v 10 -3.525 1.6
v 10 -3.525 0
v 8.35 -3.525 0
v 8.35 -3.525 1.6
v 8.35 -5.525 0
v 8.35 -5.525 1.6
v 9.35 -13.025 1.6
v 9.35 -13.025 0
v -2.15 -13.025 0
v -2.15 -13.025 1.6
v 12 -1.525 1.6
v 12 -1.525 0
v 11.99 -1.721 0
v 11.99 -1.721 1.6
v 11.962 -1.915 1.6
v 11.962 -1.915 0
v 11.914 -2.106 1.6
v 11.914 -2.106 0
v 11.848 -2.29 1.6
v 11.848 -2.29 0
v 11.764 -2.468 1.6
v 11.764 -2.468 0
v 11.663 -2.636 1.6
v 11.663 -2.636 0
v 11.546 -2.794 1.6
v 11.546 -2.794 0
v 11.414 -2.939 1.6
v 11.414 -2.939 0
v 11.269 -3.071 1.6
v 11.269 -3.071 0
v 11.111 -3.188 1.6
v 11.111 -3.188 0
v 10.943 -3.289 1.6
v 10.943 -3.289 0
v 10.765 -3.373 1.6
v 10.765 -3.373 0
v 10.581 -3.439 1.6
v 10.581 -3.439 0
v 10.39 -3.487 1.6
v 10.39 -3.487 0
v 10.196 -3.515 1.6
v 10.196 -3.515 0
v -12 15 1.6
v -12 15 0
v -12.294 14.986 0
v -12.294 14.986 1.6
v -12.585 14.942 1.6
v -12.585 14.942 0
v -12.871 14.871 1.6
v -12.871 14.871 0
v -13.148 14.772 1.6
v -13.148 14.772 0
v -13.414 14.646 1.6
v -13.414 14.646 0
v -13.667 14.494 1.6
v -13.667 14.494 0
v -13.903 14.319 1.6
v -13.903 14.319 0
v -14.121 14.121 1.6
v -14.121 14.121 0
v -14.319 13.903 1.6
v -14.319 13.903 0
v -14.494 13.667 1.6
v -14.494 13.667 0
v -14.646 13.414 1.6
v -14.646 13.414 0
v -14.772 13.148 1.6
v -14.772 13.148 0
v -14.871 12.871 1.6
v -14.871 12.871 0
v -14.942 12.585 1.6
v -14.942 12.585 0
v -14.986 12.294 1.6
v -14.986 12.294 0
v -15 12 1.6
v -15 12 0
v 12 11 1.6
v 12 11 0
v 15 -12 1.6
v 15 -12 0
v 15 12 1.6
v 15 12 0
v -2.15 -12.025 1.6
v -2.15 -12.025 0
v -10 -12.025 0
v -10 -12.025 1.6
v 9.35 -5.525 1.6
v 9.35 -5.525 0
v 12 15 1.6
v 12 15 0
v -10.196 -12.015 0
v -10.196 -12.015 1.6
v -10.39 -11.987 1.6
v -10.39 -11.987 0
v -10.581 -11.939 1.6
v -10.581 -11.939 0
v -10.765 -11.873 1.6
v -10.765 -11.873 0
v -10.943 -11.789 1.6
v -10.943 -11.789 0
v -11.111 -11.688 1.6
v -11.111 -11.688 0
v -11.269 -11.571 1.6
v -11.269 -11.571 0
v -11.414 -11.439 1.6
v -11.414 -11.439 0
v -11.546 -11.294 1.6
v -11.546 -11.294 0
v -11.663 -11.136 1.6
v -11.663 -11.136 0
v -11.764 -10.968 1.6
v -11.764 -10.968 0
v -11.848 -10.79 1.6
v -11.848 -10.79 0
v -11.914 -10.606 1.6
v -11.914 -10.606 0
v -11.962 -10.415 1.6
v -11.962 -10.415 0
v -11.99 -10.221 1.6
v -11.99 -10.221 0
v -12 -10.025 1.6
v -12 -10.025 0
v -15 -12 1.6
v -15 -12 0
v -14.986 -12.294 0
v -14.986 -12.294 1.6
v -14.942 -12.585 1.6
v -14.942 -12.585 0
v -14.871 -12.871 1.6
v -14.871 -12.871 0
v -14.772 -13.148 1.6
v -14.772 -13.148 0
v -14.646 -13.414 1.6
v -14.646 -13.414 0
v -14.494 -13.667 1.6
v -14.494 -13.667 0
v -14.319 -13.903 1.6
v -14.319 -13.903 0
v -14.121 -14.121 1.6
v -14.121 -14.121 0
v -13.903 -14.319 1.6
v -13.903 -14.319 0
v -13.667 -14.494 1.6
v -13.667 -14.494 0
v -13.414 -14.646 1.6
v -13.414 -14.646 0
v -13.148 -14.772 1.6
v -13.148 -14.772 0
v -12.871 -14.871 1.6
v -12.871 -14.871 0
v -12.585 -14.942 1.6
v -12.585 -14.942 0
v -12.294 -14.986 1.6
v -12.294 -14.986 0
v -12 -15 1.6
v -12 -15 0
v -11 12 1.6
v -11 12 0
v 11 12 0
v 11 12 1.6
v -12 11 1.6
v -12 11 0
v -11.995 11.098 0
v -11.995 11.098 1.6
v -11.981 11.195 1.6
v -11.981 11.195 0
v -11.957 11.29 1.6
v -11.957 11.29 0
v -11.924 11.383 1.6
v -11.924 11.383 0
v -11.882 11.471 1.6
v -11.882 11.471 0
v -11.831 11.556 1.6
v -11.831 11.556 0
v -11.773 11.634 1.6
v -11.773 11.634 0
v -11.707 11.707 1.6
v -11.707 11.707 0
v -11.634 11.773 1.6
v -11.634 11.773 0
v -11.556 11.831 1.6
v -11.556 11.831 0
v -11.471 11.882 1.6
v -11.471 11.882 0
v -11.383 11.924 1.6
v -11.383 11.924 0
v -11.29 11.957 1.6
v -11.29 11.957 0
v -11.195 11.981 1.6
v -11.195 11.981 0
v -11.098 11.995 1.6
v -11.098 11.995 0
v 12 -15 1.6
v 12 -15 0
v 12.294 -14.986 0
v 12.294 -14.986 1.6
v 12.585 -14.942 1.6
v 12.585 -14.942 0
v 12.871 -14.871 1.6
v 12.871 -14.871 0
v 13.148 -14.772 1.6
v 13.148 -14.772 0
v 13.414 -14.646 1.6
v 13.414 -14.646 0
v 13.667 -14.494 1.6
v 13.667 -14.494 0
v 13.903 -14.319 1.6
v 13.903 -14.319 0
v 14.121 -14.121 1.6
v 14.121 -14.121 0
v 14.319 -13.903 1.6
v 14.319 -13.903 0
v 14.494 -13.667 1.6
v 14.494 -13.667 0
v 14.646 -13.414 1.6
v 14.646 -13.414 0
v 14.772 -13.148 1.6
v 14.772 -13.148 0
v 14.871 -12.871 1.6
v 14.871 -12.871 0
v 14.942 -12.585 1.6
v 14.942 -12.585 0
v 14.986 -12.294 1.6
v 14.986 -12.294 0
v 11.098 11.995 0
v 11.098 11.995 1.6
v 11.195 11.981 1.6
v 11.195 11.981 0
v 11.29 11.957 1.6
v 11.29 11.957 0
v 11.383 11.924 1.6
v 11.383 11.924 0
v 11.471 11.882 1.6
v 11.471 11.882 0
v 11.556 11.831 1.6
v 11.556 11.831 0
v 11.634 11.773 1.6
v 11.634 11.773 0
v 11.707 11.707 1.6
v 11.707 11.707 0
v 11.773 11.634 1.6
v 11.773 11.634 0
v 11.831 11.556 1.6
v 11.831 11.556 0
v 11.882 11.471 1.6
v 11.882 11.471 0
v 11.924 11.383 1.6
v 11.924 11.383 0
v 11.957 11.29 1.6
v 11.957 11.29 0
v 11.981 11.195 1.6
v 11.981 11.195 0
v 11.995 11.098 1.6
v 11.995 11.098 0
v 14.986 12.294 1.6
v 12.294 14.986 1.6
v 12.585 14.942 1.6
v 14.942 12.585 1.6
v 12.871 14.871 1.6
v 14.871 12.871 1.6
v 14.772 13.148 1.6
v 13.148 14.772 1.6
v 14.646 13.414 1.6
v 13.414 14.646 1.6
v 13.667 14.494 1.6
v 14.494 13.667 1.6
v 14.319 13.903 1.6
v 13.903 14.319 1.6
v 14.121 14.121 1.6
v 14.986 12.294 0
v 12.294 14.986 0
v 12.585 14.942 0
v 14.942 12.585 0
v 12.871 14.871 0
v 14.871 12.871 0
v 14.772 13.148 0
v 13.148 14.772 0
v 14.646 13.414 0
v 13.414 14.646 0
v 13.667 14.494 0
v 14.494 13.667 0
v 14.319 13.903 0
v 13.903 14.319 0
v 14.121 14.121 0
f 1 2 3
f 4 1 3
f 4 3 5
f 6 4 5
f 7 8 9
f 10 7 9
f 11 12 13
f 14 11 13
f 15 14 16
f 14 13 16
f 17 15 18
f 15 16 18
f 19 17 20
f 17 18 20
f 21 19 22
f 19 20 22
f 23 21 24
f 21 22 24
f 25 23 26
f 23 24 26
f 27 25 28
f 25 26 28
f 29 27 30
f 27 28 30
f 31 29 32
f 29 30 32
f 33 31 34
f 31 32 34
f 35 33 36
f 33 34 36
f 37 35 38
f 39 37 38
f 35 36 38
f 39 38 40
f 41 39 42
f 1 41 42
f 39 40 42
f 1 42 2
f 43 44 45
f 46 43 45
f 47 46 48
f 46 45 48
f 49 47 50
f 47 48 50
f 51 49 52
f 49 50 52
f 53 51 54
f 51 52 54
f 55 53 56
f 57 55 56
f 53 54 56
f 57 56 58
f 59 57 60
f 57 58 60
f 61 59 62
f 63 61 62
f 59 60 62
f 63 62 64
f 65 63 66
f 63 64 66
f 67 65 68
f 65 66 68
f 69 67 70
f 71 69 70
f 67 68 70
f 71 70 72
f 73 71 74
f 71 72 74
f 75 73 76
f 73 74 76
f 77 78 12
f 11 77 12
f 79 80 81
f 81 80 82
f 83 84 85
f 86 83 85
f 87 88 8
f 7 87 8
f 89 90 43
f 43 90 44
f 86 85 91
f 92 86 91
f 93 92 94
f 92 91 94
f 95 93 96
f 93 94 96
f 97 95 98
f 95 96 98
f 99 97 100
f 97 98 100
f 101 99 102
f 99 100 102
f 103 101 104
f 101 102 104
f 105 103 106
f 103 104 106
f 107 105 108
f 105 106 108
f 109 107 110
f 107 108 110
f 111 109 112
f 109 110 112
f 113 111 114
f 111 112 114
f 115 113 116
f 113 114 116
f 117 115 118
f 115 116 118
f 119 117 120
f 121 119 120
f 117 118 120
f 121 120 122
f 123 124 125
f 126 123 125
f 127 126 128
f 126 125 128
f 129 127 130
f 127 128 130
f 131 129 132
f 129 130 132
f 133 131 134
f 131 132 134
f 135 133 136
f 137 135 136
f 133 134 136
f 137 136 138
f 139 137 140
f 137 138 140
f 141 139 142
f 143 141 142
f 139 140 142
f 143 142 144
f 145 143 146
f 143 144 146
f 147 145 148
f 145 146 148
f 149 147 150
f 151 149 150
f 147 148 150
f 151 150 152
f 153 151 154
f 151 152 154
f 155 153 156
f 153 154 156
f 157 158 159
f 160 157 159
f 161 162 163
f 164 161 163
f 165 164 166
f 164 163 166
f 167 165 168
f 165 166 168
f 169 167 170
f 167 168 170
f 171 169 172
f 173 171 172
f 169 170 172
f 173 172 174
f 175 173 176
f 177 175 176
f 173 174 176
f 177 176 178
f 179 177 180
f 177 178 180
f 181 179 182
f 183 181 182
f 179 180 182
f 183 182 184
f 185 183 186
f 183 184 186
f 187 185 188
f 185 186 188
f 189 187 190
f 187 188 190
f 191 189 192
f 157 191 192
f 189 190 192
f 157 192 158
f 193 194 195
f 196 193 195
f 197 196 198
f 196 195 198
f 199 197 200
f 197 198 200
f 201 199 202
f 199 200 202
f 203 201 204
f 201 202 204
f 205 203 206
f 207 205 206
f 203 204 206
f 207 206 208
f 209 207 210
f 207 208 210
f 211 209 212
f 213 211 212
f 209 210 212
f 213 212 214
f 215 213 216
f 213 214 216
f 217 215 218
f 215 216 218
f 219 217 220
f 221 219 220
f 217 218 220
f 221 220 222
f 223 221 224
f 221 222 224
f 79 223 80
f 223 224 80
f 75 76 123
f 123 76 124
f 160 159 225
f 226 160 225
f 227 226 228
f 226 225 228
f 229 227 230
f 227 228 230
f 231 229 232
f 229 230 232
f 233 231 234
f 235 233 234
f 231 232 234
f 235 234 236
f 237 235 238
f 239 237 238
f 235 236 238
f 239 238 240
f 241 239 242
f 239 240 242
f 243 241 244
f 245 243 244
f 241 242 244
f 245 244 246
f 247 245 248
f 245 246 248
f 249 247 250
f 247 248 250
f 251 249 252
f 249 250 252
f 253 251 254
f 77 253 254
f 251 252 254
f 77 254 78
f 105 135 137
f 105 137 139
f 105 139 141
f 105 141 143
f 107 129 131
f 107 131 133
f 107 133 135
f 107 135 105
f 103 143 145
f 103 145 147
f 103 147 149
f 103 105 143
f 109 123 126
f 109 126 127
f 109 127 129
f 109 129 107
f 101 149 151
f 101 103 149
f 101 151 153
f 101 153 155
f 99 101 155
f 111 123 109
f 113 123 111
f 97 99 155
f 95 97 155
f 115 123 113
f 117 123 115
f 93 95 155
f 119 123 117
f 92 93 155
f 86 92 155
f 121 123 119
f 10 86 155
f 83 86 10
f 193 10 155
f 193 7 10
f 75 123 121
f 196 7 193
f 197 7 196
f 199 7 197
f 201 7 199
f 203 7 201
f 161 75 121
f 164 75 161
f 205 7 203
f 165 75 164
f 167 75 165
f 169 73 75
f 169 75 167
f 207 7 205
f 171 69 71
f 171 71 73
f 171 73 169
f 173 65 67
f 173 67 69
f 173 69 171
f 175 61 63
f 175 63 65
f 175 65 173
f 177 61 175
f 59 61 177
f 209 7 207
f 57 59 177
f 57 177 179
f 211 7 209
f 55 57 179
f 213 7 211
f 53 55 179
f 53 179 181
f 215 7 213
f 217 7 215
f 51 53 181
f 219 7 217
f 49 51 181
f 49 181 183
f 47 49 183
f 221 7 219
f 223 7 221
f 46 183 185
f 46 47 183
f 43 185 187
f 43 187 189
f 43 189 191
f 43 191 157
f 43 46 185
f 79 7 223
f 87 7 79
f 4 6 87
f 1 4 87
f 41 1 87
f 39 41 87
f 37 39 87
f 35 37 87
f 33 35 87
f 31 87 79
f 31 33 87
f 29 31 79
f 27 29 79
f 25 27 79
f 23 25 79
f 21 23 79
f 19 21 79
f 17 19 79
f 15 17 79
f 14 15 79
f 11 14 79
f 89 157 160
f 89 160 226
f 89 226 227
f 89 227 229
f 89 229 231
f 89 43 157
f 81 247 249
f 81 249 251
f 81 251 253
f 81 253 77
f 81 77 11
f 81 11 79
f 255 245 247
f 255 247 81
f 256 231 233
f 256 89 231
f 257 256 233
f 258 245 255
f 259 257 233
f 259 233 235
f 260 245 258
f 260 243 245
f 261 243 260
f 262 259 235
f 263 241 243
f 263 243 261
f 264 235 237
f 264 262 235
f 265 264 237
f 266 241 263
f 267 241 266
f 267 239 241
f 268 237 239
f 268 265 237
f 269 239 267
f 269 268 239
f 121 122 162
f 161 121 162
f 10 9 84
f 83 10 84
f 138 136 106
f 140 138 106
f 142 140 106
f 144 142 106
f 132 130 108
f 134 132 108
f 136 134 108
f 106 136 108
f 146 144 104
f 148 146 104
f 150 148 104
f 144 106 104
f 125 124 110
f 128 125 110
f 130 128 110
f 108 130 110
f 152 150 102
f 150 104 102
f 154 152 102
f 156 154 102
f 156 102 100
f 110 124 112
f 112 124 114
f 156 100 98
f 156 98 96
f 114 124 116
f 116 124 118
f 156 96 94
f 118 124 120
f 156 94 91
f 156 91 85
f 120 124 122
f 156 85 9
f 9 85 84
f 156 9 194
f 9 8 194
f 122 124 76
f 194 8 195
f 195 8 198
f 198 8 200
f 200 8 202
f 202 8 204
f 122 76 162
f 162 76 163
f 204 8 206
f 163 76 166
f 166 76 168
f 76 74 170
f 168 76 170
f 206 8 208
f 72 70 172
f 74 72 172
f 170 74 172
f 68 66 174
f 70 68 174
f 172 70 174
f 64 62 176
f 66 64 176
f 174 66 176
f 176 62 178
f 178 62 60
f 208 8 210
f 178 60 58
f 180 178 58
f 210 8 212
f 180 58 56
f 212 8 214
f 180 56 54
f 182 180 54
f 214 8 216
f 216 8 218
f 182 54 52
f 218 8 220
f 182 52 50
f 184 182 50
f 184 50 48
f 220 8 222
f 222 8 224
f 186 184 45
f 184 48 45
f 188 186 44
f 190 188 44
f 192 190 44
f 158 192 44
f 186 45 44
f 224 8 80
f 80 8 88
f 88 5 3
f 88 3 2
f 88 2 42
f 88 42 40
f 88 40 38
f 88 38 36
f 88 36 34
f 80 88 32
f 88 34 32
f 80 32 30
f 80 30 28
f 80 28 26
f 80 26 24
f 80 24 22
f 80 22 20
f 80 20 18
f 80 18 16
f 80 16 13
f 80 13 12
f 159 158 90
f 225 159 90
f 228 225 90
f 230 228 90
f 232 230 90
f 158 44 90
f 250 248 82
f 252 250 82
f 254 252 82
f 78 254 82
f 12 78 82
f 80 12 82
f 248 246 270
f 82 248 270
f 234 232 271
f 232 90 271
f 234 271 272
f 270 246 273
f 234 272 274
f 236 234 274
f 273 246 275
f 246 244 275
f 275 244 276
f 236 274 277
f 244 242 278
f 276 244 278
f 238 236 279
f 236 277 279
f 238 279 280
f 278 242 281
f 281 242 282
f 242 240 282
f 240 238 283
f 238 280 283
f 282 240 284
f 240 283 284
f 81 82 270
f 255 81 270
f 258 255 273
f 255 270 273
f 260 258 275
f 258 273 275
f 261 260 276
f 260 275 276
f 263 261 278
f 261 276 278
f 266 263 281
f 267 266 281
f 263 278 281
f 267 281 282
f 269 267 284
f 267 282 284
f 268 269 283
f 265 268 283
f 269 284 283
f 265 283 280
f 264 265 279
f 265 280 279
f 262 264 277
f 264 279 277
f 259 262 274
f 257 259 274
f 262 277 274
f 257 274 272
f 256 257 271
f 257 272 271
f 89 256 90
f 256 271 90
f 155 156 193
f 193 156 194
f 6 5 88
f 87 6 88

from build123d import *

# Parameters (mm, degrees)
F1_DEPTH = 1.6


# Not quite as in the source:
# - a feature names something its author has since deleted; it is built from what else it names


with BuildPart() as f1:
    # F0 (on Top) → F1 (new body)
    with BuildSketch(Plane.XY):
        with BuildLine():
            ThreePointArc((15, 12), (14.1213203436, 14.1213203436), (12, 15))
            Line((12, 15), (-12, 15))
            ThreePointArc((-12, 15), (-14.1213203436, 14.1213203436), (-15, 12))
            Line((-15, 12), (-15, -12))
            ThreePointArc((-15, -12), (-14.1213203436, -14.1213203436), (-12, -15))
            Line((-12, -15), (12, -15))
            ThreePointArc((12, -15), (14.1213203436, -14.1213203436), (15, -12))
            Line((15, -12), (15, 12))
        make_face()
        with BuildLine():
            Line((9.35, -13.025), (-2.15, -13.025))
            Line((-2.15, -13.025), (-2.15, -12.025))
            Line((-2.15, -12.025), (-10, -12.025))
            ThreePointArc((-10, -12.025), (-11.4142135624, -11.4392135624), (-12, -10.025))
            Line((-12, -10.025), (-12, 11))
            ThreePointArc((-12, 11), (-11.7071067812, 11.7071067812), (-11, 12))
            Line((-11, 12), (11, 12))
            ThreePointArc((11, 12), (11.7071067812, 11.7071067812), (12, 11))
            Line((12, 11), (12, -1.525))
            ThreePointArc((12, -1.525), (11.4142135624, -2.9392135624), (10, -3.525))
            Line((10, -3.525), (8.35, -3.525))
            Line((8.35, -3.525), (8.35, -5.525))
            Line((8.35, -5.525), (9.35, -5.525))
            Line((9.35, -5.525), (9.35, -13.025))
        make_face(mode=Mode.SUBTRACT)
    extrude(amount=F1_DEPTH)


solid = f1.part
